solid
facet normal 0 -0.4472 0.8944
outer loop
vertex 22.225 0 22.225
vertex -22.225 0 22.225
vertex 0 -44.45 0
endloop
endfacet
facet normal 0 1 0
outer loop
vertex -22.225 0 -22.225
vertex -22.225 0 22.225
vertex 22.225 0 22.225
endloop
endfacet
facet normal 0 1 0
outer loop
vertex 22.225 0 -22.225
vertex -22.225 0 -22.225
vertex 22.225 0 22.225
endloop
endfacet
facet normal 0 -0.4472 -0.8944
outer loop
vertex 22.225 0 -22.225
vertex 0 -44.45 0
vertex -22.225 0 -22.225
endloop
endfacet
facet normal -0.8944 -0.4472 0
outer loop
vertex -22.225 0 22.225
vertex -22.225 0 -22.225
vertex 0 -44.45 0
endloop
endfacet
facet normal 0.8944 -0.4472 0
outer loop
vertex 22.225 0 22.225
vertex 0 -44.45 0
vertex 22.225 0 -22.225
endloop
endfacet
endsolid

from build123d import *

# Parameters (mm, degrees)
F0_W     = 44.45
F0_H     = 44.45
F1_DEPTH = 44.45
F4_DEPTH = 44.451
F5_DEPTH = 44.451


with BuildPart() as f1:
    # F0 (on Front) → F1 (new body)
    with BuildSketch(Plane.XZ):
        Rectangle(F0_W, F0_H)
    extrude(amount=F1_DEPTH)

    # F2 (on face) → F4 (cut, through all)
    with BuildSketch(Plane(origin=(-22.225, 0, 0), x_dir=(0, -1, 0), z_dir=(-1, 0, 0))):
        Polygon((44.45, 22.225), (0, 22.225), (44.45, 0), align=None)
        Polygon((44.45, -22.225), (44.45, 0), (0, -22.225), align=None)
    extrude(amount=-F4_DEPTH, mode=Mode.SUBTRACT)

    # F3 (on face) → F5 (cut, through all)
    with BuildSketch(Plane(origin=(0, 0, -22.225), x_dir=(1, 0, 0), z_dir=(0, 0, -1))):
        Polygon((22.225, 44.45), (0, 44.45), (22.225, 0), align=None)
        Polygon((-22.225, 44.45), (-22.225, 0), (0, 44.45), align=None)
    extrude(amount=-F5_DEPTH, mode=Mode.SUBTRACT)


solid = f1.part
